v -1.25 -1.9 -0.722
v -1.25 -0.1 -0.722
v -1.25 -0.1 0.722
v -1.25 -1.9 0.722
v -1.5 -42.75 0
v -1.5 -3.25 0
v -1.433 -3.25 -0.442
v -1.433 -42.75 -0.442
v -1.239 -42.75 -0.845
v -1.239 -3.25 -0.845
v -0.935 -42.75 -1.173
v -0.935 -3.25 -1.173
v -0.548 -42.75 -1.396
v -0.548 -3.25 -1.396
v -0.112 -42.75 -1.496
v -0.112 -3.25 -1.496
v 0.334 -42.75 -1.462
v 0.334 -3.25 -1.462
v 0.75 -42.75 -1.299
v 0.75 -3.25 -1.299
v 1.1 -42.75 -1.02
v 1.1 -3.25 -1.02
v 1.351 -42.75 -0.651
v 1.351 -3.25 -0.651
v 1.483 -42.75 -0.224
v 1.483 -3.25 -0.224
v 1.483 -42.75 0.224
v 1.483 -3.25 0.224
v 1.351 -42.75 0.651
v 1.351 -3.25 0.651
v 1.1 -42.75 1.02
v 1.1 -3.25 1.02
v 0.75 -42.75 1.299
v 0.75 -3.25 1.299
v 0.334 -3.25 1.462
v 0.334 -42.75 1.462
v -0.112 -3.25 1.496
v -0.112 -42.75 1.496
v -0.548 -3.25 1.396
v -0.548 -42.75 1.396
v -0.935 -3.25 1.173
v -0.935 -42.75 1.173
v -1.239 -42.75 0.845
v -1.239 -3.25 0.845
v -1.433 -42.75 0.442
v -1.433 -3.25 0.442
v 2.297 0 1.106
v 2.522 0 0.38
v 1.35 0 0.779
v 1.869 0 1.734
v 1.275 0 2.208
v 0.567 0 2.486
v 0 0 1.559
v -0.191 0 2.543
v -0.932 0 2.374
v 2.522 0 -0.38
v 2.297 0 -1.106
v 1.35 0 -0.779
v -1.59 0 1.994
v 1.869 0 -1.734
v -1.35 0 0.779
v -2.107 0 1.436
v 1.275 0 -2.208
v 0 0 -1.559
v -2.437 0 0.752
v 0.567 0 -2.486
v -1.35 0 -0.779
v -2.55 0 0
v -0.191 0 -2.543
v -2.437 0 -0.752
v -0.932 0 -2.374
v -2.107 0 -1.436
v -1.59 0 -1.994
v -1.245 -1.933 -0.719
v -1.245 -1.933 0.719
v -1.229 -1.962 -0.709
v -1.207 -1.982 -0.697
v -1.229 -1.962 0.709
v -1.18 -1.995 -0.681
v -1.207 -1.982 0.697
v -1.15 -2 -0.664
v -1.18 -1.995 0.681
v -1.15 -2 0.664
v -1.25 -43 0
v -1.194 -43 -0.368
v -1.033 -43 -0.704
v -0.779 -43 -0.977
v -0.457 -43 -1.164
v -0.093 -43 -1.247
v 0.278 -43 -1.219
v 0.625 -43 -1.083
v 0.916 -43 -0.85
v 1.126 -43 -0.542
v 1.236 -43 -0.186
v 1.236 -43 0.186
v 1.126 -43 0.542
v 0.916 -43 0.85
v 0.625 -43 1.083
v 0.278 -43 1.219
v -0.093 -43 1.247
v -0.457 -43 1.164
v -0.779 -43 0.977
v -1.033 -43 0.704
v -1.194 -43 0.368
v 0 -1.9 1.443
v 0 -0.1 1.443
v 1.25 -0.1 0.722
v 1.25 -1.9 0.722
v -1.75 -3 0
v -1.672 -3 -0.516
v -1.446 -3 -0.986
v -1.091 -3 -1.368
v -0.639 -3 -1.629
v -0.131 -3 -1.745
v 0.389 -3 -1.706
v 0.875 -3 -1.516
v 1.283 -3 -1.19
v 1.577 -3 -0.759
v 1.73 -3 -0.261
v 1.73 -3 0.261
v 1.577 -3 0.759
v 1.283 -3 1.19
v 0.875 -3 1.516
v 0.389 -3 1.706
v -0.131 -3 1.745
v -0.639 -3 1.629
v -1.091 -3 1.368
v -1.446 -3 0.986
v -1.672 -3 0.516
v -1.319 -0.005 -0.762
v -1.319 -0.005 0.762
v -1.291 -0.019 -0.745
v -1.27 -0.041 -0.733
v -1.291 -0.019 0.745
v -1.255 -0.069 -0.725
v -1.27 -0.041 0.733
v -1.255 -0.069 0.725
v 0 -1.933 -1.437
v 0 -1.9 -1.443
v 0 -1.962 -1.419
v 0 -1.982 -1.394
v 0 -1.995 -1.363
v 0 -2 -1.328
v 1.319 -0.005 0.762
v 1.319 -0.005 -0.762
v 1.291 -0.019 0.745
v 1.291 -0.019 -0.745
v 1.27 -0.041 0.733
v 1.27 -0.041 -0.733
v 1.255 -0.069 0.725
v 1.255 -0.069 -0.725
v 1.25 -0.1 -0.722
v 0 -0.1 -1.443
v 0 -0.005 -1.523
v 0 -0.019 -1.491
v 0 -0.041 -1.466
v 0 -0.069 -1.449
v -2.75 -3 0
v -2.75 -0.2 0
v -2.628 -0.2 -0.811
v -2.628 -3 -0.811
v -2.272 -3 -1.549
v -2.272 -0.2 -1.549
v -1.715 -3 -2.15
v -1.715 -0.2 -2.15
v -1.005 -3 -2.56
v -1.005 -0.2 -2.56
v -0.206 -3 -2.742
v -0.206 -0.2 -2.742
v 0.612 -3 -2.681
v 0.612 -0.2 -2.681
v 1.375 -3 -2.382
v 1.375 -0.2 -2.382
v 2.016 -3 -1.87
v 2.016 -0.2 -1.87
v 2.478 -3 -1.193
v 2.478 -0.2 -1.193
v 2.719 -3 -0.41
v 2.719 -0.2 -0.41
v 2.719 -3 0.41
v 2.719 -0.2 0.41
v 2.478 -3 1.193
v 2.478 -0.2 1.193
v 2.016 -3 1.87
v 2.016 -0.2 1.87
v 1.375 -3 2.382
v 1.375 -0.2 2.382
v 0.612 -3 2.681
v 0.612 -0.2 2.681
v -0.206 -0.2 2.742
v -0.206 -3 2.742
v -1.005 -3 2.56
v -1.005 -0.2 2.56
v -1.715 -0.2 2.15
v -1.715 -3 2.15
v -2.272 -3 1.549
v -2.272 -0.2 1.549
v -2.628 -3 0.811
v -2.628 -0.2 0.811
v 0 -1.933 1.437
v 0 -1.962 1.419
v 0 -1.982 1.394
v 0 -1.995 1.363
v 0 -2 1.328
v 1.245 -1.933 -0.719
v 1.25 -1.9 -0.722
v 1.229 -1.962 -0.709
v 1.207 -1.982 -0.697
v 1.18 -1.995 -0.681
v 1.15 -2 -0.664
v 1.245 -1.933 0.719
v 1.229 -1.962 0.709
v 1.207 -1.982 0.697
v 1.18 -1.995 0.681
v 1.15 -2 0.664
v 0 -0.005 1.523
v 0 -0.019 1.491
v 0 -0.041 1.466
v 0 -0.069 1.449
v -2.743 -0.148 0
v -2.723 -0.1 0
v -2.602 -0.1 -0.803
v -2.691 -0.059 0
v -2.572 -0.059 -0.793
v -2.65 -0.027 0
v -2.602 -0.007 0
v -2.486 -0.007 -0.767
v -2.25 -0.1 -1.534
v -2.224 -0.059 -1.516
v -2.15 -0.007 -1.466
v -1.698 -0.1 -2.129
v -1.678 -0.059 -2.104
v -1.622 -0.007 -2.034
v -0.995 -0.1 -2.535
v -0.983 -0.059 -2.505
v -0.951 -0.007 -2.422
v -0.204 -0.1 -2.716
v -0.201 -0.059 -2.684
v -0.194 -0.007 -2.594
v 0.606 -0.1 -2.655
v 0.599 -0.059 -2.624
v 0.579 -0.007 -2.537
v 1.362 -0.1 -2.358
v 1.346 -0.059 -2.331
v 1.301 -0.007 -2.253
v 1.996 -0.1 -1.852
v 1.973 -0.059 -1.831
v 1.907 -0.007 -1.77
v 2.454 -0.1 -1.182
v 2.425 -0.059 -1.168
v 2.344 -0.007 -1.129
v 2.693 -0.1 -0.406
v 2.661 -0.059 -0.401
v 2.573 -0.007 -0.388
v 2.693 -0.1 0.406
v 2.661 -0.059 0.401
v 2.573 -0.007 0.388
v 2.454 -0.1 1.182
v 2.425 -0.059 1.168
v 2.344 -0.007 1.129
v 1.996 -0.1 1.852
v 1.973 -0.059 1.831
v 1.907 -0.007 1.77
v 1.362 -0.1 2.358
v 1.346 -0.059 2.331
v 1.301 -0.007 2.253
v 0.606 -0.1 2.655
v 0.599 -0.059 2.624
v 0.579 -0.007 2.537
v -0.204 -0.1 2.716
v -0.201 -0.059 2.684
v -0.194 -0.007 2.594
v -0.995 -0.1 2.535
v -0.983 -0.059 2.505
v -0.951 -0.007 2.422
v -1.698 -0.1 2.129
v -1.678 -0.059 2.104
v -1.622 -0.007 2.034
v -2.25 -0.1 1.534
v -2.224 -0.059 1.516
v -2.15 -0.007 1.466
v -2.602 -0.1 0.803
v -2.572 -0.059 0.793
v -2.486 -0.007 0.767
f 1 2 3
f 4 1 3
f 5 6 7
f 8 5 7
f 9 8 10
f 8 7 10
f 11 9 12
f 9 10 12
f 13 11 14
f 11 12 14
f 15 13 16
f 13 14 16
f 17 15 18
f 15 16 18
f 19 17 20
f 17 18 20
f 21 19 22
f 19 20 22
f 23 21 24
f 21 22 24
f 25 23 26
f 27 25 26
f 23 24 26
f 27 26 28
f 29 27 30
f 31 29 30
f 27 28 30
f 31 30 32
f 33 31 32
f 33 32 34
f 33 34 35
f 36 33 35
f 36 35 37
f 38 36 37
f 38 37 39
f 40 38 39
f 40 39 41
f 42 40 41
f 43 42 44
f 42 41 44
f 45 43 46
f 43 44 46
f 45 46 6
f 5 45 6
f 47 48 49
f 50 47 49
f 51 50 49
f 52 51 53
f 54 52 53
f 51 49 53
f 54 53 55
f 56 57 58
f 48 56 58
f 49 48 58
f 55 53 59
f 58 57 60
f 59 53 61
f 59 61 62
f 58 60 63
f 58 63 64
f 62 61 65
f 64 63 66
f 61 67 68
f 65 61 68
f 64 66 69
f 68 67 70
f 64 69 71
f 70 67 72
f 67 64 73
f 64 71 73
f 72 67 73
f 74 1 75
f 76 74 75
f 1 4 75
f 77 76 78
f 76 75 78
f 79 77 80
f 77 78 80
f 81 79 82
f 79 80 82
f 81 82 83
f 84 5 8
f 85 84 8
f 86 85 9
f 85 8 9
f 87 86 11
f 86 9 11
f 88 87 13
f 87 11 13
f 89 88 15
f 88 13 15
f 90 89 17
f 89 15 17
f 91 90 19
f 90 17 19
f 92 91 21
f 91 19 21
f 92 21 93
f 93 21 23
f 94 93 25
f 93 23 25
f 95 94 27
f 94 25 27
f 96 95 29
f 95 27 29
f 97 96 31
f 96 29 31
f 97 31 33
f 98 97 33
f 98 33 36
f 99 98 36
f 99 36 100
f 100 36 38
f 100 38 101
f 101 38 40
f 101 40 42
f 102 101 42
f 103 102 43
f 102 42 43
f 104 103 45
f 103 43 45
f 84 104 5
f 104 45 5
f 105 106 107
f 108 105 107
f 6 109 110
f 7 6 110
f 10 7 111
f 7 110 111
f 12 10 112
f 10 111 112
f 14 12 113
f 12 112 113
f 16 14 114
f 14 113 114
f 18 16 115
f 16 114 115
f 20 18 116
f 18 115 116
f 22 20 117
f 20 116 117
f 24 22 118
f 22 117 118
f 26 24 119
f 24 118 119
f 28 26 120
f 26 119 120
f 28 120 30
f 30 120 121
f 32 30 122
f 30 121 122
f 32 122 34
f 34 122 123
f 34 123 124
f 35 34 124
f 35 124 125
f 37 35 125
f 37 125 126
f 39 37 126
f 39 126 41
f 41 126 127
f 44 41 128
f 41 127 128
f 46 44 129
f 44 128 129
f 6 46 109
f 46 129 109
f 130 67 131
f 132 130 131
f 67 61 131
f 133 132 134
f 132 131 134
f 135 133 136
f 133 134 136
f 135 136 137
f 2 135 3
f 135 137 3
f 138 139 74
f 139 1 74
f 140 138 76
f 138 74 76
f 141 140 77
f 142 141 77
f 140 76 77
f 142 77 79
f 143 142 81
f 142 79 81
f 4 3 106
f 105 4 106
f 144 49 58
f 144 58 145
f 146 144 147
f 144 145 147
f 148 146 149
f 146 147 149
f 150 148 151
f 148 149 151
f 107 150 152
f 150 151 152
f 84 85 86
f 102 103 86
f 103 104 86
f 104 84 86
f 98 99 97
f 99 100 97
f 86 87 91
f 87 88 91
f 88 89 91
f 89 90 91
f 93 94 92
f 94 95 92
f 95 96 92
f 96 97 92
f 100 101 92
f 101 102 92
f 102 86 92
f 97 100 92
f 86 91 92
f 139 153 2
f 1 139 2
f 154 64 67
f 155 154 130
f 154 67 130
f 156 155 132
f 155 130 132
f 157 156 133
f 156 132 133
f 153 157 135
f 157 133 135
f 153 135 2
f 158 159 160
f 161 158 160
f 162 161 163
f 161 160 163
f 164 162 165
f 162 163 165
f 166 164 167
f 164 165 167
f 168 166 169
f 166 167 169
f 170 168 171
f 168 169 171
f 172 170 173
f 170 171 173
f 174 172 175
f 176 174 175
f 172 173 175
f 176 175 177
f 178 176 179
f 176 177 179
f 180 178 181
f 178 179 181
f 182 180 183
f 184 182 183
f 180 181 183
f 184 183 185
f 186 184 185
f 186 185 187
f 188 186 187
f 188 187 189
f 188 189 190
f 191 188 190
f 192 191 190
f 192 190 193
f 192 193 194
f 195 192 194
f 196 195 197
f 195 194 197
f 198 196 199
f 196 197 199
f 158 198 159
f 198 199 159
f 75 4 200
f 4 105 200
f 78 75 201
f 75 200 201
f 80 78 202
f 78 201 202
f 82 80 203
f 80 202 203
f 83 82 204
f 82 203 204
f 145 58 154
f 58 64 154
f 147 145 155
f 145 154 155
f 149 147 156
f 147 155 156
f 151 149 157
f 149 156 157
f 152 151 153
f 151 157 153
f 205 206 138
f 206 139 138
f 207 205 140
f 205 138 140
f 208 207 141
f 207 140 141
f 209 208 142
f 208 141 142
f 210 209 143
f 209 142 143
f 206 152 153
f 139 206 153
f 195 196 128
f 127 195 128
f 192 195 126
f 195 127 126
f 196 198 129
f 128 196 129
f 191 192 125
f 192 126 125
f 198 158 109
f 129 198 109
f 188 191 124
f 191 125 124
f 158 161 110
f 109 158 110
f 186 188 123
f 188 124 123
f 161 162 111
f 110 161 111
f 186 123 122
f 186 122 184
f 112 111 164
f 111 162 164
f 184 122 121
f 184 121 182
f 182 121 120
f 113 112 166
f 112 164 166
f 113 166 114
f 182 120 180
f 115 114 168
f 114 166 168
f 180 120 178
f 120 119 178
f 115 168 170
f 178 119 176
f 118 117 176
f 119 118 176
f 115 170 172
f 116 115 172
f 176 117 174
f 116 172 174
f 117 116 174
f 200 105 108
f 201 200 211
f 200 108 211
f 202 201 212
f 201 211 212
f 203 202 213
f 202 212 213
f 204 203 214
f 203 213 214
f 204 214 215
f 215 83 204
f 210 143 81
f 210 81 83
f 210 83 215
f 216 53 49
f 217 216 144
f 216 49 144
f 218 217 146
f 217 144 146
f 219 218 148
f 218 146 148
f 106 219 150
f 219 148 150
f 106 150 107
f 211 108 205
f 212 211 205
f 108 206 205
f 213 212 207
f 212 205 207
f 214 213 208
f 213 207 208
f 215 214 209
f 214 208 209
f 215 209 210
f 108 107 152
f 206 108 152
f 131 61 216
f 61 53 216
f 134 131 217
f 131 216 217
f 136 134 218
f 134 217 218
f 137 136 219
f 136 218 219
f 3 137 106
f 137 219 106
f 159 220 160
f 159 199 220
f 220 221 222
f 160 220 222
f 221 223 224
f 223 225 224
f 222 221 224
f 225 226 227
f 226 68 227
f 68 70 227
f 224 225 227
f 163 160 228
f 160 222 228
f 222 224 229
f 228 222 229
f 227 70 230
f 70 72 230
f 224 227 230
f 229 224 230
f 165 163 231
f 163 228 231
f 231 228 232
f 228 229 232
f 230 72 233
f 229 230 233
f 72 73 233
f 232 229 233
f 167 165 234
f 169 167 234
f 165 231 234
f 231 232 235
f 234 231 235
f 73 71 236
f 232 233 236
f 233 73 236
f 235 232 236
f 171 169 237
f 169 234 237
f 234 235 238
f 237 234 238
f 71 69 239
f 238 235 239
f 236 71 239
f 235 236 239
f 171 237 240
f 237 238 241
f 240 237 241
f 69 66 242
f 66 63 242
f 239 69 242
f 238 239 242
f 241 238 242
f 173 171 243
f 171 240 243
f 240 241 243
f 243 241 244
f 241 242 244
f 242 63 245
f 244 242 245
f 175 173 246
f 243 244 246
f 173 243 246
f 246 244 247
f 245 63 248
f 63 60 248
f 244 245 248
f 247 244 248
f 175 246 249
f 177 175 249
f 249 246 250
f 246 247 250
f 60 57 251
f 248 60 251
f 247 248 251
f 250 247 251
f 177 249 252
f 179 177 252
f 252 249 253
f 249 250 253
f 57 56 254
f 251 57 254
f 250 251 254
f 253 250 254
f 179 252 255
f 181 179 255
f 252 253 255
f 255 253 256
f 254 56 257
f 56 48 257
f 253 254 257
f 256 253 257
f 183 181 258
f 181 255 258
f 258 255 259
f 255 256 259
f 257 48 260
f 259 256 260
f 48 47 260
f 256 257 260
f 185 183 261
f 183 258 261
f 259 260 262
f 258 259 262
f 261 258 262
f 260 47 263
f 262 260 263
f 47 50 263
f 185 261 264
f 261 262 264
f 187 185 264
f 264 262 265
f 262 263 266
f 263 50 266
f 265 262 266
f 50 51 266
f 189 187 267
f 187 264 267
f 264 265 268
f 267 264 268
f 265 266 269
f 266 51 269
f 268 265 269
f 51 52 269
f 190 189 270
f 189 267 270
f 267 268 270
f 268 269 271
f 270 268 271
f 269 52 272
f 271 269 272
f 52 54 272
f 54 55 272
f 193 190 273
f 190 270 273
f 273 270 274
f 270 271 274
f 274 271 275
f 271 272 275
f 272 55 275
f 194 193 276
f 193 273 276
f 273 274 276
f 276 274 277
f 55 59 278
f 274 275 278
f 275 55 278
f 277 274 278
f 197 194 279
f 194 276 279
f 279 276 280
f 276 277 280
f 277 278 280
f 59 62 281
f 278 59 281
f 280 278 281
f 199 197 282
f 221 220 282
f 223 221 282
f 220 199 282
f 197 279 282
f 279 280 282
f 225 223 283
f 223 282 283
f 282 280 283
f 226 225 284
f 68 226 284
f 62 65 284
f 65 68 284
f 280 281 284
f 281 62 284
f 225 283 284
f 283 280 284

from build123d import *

# Parameters (mm, degrees)
CHAMFER1_SIZE      = 0.25
FILLET1_R          = 0.2
CUT_EXTRUDE1_DEPTH = 2
FILLET2_R          = 0.1


with BuildPart() as part:
    # Sketch1 → Revolve1 (revolve)
    with BuildSketch(Plane.XY):
        Polygon((0, -43), (-1.5, -43), (-1.5, -3), (-2.75, -3), (-2.75, 0), (0, 0), align=None)
    revolve(axis=Axis((0, 0, 0), (0, -1, 0)))

    # Chamfer1
    chamfer1_edges = [part.edges().sort_by_distance(p)[0] for p in [
        (1.5, -3, 0),
        (1.5, -43, 0),
    ]]
    chamfer(chamfer1_edges, length=CHAMFER1_SIZE)

    # Fillet1
    fillet1_edges = [part.edges().sort_by_distance(p)[0] for p in [
        (2.75, 0, 0),
    ]]
    fillet(fillet1_edges, radius=FILLET1_R)

    # Sketch2 → Cut-Extrude1 (cut)
    with BuildSketch(Plane(origin=(0, 0, 0), x_dir=(1, 0, 0), z_dir=(0, 1, 0))):
        Polygon((0, 1.443375673), (-1.25, 0.721687836), (-1.25, -0.721687836), (0, -1.443375673), (1.25, -0.721687836), (1.25, 0.721687836), align=None)
    extrude(amount=-CUT_EXTRUDE1_DEPTH, mode=Mode.SUBTRACT)

    # Fillet2
    fillet2_edges = [part.edges().sort_by_distance(p)[0] for p in [
        (0.625, -2, -1.082531755),
        (1.25, -2, 0),
        (0.625, -2, 1.082531755),
        (-0.625, -2, 1.082531755),
        (-1.25, -2, 0),
        (-0.625, -2, -1.082531755),
        (0.625, 0, -1.082531755),
        (-0.625, 0, -1.082531755),
        (-1.25, 0, 0),
        (-0.625, 0, 1.082531755),
        (0.625, 0, 1.082531755),
        (1.25, 0, 0),
    ]]
    fillet(fillet2_edges, radius=FILLET2_R)


solid = part.part
